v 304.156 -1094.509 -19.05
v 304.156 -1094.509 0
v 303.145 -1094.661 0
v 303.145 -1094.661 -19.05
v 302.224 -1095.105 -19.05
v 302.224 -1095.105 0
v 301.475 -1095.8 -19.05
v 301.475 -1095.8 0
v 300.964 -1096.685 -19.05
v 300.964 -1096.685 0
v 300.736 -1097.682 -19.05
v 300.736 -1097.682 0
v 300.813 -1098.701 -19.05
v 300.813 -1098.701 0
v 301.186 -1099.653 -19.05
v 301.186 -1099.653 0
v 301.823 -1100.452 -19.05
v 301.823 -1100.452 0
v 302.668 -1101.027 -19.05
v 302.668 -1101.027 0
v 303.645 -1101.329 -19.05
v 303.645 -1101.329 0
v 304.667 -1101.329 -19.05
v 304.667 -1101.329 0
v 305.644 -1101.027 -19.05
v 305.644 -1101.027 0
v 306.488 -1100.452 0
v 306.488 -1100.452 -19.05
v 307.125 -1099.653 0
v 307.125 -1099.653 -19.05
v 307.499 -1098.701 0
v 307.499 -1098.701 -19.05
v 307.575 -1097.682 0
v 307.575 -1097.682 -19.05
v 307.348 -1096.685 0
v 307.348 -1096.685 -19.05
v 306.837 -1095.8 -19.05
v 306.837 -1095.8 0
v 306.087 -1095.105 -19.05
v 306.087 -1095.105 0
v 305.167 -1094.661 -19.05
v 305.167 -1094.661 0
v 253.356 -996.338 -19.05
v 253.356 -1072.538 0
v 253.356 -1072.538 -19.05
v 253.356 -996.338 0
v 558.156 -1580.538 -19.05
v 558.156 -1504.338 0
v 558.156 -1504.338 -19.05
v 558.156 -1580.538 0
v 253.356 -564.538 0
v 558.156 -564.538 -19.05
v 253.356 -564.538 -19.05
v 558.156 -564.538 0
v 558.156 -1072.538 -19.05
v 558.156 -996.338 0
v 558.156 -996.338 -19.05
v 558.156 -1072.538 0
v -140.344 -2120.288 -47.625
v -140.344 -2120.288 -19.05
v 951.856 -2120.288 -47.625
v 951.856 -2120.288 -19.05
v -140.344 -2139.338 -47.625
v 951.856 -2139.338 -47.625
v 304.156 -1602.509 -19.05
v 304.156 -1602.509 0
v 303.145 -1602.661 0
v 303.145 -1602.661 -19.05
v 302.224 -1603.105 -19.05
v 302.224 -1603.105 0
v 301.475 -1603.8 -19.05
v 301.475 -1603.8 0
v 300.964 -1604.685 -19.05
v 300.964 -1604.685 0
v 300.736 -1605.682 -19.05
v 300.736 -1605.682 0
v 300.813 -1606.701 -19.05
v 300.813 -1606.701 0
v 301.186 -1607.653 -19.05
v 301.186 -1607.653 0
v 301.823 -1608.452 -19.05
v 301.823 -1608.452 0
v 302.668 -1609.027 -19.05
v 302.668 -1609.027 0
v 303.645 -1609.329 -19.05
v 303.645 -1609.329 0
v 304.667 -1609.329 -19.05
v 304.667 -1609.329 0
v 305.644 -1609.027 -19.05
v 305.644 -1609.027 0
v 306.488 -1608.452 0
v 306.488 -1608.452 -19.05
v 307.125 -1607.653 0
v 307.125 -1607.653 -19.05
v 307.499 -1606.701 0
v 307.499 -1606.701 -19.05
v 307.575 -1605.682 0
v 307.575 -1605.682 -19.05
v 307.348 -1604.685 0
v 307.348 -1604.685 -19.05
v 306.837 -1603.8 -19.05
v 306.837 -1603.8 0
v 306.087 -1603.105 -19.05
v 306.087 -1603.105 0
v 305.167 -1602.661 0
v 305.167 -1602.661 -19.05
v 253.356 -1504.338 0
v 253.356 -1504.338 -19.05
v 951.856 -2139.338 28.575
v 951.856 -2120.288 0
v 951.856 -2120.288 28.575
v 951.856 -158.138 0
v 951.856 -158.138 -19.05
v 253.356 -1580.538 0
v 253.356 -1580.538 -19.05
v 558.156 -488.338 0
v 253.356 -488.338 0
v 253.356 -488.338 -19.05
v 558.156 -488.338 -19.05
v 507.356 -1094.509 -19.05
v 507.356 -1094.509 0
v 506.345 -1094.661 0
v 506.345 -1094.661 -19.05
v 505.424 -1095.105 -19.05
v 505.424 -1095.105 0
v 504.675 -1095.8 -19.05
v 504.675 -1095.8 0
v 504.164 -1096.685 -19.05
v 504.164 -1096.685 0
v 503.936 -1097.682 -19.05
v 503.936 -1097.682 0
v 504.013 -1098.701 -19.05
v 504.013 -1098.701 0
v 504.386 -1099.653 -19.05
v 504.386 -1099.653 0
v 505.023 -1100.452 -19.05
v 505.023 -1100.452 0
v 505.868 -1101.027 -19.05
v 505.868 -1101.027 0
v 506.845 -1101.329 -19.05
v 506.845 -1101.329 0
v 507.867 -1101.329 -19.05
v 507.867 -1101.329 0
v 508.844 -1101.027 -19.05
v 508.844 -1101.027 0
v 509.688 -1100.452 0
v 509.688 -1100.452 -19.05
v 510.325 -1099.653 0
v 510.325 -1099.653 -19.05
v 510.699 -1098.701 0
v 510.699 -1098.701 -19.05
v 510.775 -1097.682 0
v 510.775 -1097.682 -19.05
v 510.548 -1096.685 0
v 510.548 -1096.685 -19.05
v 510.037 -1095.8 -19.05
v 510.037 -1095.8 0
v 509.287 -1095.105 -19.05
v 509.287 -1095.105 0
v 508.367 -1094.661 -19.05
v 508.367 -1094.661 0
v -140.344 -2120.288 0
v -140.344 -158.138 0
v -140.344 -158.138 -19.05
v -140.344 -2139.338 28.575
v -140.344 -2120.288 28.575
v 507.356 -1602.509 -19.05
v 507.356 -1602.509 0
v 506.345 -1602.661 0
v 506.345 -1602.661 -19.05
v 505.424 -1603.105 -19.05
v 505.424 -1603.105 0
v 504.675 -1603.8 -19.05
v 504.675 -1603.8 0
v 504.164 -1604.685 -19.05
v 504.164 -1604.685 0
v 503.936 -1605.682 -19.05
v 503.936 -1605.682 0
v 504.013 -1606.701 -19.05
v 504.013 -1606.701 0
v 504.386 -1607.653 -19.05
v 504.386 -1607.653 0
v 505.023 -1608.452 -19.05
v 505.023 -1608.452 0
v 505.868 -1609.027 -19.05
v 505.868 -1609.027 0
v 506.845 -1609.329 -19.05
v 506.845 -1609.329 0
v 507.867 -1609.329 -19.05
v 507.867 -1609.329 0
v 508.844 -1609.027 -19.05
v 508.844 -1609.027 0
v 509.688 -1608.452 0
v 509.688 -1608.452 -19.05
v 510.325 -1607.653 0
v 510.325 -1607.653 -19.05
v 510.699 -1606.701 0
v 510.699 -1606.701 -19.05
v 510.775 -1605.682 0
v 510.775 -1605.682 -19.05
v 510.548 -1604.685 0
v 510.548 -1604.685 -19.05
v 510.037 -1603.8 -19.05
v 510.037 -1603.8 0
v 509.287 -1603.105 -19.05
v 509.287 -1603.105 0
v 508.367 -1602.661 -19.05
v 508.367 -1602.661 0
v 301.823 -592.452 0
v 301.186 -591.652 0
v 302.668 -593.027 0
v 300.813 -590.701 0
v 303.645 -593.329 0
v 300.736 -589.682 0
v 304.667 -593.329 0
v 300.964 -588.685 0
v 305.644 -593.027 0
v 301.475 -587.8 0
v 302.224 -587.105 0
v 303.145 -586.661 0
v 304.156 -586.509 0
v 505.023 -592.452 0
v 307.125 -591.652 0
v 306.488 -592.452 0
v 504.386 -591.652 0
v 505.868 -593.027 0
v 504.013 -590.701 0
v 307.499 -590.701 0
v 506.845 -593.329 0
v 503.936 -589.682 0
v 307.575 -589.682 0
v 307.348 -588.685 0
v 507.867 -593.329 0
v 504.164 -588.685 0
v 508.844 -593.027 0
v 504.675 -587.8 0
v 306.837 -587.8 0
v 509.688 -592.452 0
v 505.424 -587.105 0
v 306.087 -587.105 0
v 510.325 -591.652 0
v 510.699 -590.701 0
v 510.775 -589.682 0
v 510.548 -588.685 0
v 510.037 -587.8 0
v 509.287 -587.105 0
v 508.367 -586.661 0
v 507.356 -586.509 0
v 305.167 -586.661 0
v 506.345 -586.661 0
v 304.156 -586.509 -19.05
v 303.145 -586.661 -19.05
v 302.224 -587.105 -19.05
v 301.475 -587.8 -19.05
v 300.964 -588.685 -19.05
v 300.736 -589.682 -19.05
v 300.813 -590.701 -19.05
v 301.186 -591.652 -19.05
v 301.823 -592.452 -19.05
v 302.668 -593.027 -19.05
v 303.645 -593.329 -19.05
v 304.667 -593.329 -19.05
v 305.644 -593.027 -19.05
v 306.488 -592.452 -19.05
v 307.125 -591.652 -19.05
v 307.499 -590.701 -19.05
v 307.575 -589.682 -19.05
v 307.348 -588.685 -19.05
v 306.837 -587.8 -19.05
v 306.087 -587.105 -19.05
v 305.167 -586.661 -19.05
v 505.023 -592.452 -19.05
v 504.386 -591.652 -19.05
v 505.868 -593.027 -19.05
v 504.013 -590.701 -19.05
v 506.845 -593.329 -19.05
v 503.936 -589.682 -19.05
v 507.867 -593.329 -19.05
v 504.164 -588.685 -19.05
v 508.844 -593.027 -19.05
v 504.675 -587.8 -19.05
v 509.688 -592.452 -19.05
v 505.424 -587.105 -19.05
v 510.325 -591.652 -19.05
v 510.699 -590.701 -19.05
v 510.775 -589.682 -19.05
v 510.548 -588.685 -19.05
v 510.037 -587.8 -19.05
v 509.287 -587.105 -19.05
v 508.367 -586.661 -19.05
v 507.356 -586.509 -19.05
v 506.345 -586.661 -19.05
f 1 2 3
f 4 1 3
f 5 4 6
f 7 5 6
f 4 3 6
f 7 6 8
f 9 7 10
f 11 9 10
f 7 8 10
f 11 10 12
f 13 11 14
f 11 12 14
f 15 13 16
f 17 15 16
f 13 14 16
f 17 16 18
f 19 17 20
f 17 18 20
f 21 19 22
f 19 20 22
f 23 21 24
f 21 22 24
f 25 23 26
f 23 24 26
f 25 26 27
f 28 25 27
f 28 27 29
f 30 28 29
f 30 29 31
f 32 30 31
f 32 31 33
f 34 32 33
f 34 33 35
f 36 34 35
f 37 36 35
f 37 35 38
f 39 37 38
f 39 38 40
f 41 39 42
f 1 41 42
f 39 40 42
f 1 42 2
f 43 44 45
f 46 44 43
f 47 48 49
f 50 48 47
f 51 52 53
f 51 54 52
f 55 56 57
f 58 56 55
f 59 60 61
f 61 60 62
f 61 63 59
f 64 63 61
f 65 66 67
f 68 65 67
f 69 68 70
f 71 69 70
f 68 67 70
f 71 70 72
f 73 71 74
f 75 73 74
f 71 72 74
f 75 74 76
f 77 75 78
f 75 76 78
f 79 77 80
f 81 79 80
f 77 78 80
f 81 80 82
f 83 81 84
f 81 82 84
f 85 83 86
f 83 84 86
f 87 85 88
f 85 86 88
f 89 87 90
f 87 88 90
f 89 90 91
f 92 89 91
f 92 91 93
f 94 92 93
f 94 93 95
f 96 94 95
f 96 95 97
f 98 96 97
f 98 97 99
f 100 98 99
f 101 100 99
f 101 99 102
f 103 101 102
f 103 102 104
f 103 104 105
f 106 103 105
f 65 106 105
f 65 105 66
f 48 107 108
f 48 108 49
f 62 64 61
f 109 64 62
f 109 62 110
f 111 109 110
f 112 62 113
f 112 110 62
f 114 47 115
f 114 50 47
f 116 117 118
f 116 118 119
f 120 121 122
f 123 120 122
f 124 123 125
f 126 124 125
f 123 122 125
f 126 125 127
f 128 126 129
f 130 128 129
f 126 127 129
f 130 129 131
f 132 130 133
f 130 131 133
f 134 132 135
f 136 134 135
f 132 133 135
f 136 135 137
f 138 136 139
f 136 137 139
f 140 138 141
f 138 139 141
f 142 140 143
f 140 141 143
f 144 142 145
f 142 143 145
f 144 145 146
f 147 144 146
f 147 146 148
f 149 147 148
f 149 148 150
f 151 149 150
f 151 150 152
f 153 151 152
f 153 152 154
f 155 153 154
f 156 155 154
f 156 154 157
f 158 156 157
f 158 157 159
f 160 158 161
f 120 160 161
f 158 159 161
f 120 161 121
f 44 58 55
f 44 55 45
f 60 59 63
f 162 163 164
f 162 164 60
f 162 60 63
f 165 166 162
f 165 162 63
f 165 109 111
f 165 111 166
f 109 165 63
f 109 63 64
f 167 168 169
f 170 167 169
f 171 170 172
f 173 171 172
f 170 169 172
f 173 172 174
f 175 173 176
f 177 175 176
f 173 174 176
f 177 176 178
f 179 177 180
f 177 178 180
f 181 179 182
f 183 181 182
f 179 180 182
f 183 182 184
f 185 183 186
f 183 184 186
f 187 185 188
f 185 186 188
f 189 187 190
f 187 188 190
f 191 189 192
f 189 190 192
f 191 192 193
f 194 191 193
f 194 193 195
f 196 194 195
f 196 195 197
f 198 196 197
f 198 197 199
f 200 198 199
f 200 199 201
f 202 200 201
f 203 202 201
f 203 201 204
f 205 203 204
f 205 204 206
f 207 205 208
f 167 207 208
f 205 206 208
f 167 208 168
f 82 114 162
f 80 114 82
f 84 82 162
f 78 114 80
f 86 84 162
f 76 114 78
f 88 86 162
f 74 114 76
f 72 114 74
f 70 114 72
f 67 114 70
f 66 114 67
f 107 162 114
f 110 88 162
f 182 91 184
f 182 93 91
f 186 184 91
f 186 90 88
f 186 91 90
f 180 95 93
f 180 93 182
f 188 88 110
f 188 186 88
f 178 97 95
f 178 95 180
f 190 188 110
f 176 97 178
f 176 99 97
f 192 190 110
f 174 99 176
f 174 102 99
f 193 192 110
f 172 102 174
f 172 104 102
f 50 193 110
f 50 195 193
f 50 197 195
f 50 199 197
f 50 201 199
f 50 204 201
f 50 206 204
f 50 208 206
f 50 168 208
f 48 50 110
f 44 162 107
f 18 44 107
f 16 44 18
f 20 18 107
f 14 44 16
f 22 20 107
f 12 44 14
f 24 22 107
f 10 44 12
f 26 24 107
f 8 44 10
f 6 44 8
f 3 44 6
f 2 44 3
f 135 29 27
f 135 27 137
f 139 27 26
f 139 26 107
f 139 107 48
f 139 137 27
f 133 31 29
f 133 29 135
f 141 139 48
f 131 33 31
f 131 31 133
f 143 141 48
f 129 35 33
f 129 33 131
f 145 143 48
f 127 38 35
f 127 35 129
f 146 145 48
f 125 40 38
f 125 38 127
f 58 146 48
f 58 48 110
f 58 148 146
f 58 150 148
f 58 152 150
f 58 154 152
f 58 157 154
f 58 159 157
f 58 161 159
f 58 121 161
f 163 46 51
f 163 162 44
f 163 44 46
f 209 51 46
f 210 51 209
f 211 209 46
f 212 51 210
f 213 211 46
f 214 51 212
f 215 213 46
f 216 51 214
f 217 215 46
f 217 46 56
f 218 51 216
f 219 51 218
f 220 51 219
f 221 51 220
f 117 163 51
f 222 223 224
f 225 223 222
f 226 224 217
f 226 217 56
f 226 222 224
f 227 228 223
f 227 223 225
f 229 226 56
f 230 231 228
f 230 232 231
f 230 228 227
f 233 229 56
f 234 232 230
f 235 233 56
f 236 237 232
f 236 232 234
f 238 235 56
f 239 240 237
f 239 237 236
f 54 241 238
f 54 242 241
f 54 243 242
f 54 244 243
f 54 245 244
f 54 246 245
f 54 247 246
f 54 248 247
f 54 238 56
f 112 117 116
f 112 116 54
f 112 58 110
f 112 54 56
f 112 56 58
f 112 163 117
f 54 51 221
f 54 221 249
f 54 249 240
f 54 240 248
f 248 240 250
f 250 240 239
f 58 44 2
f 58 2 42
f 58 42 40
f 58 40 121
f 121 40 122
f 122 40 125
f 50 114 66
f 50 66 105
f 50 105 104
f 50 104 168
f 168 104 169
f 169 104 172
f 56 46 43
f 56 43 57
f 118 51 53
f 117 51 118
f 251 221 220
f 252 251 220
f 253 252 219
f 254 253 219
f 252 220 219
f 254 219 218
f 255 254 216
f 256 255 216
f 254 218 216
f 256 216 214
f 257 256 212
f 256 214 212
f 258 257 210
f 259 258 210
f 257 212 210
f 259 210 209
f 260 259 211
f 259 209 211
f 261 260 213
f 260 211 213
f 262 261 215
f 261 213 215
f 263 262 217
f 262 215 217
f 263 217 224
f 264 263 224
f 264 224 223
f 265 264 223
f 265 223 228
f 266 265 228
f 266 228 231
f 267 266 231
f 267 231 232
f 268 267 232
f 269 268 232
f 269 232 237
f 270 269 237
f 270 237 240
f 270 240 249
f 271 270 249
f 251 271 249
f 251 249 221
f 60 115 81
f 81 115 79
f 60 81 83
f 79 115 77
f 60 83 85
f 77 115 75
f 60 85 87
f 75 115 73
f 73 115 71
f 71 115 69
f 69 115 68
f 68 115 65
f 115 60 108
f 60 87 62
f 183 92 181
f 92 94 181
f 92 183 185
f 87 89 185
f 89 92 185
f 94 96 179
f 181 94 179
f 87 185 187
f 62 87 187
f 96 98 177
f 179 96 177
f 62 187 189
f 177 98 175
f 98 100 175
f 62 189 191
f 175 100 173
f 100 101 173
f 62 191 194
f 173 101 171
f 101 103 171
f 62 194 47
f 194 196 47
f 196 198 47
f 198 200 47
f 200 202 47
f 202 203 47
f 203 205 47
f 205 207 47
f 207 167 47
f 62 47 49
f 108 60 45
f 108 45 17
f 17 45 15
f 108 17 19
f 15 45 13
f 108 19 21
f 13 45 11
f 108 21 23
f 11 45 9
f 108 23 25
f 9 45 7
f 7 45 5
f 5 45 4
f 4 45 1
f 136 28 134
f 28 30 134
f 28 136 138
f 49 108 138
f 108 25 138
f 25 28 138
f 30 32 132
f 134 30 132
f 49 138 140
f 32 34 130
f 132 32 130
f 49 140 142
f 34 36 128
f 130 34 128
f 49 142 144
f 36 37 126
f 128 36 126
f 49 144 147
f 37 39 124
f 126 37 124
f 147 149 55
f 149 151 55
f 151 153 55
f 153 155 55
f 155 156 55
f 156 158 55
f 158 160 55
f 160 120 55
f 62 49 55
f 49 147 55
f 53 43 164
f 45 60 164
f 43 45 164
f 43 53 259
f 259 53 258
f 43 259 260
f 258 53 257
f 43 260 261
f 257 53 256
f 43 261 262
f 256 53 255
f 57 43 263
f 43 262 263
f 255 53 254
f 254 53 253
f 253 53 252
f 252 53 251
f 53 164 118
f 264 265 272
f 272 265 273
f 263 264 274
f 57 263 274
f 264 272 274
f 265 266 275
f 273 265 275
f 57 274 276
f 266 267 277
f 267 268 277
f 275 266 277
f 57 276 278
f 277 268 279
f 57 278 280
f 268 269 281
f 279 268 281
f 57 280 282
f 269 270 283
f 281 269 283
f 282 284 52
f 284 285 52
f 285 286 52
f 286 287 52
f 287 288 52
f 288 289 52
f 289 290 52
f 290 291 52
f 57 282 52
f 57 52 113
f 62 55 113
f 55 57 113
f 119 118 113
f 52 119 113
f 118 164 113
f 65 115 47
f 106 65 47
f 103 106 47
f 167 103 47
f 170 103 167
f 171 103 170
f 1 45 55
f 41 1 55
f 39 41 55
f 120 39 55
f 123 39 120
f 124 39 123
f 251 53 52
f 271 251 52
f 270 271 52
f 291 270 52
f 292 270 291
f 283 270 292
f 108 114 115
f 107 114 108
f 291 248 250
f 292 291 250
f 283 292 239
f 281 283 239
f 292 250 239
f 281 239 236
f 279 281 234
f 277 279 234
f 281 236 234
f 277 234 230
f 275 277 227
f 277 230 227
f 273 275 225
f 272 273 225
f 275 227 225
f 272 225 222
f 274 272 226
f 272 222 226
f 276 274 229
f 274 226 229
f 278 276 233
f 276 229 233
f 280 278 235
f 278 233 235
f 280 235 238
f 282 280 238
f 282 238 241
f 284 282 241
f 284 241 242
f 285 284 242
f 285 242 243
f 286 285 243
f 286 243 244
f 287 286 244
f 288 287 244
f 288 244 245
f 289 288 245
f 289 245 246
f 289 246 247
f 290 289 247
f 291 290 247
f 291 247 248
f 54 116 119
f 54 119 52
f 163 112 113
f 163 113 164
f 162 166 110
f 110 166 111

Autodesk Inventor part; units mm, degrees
ref_plane "YZ Plane" through (0, 0, 0) normal (1, 0, 0) x (0, 1, 0)
ref_plane "XZ Plane" through (0, 0, 0) normal (0, 1, 0) x (-1, 0, 0)
ref_plane "XY Plane" through (0, 0, 0) normal (0, 0, 1) x (1, 0, 0)
sketch "Sketch1" plane through (0, 0, 0) normal (0, 0, 1) x (1, 0, 0)
  line L0 (-140.3442, -2139.338) -> (951.8558, -2139.338)
  line L1 (951.8558, -2139.338) -> (951.8558, -158.138)
  line L2 (951.8558, -158.138) -> (-140.3442, -158.138)
  line L3 (-140.3442, -158.138) -> (-140.3442, -2139.338)
  line L4 (253.3558, -488.338) -> (558.1558, -488.338)
  line L5 (558.1558, -488.338) -> (558.1558, -564.538)
  line L6 (558.1558, -564.538) -> (253.3558, -564.538)
  line L7 (253.3558, -564.538) -> (253.3558, -488.338)
  line L8 (253.3558, -996.338) -> (558.1558, -996.338)
  line L9 (558.1558, -996.338) -> (558.1558, -1072.538)
  line L10 (558.1558, -1072.538) -> (253.3558, -1072.538)
  line L11 (253.3558, -1072.538) -> (253.3558, -996.338)
  line L12 (253.3558, -1504.338) -> (558.1558, -1504.338)
  line L13 (558.1558, -1504.338) -> (558.1558, -1580.538)
  line L14 (558.1558, -1580.538) -> (253.3558, -1580.538)
  line L15 (253.3558, -1580.538) -> (253.3558, -1504.338)
  point P0 (0, 0)
  dimension "d0" = 1092.2
  dimension "d1" = 1981.2
  dimension "d2" = 393.7
  dimension "d3" = 393.7
  dimension "d4" = 393.7
  dimension "d5" = 304.8
  dimension "d6" = 304.8
  dimension "d7" = 304.8
  dimension "d8" = 76.2
  dimension "d9" = 76.2
  dimension "d10" = 76.2
  dimension "d11" = 558.8
  dimension "d12" = 1066.8
  dimension "d13" = 1574.8
extrude "Extrusion1" add sketch "Sketch1" against normal blind 19.05
sketch "Sketch2" plane through (-140.3442, -2139.338, 0) normal (0, -1, 0) x (1, 0, 0)
  line L0 (0, -19.05) -> (1092.2, -19.05) projected
  line L1 (1092.2, 0) -> (1092.2, -19.05) projected
  line L2 (0, 0) -> (1092.2, 0) projected
  line L3 (0, 0) -> (0, -19.05) projected
  line L4 (0, -19.05) -> (1092.2, -19.05) projected
  line L5 (1092.2, 0) -> (1092.2, -19.05) projected
  line L6 (0, 0) -> (1092.2, 0) projected
  line L7 (0, 0) -> (0, -19.05) projected
  line L8 (1092.2, 28.575) -> (0, 28.575)
  line L9 (0, 28.575) -> (0, -47.625)
  line L10 (0, -47.625) -> (1092.2, -47.625)
  line L11 (1092.2, -47.625) -> (1092.2, 28.575)
  point P0 (140.3442, 0)
  dimension "d16" = 76.2
  dimension "d17" = 28.575
extrude "Extrusion2" add sketch "Sketch2" against normal blind 19.05 contours L0 L11 L10 L9 | L9 L8 L11 L2
sketch "Sketch3" plane through (0, 0, -19.05) normal (0, 0, -1) x (-1, 0, 0)
  line L0 (-253.3558, -996.338) -> (-253.3558, -1072.538) projected
  line L1 (-253.3558, -1072.538) -> (-558.1558, -1072.538) projected
  line L2 (-558.1558, -1072.538) -> (-558.1558, -996.338) projected
  line L3 (-253.3558, -488.338) -> (-253.3558, -564.538) projected
  line L4 (-253.3558, -564.538) -> (-558.1558, -564.538) projected
  line L5 (-558.1558, -564.538) -> (-558.1558, -488.338) projected
  line L6 (-253.3558, -1504.338) -> (-253.3558, -1580.538) projected
  line L7 (-253.3558, -1580.538) -> (-558.1558, -1580.538) projected
  line L8 (-558.1558, -1580.538) -> (-558.1558, -1504.338) projected
  point P0 (0, 0)
  point P1 (-507.3558, -589.938)
  point P2 (-304.1558, -589.938)
  point P3 (-507.3558, -1097.938)
  point P4 (-304.1558, -1097.938)
  point P5 (-507.3558, -1605.938)
  point P6 (-304.1558, -1605.938)
  dimension "d20" = 50.8
  dimension "d21" = 50.8
  dimension "d22" = 25.4
  dimension "d23" = 25.4
  dimension "d24" = 50.8
  dimension "d25" = 50.8
  dimension "d26" = 25.4
  dimension "d27" = 25.4
  dimension "d28" = 50.8
  dimension "d29" = 25.4
  dimension "d30" = 50.8
  dimension "d31" = 25.4
hole "Hole1" at (507.3558, -589.938, -19.05) at (304.1558, -589.938, -19.05) at (507.3558, -1097.938, -19.05) at (304.1558, -1097.938, -19.05) at (507.3558, -1605.938, -19.05) at (304.1558, -1605.938, -19.05) direction (0, 0, 1) diameter 6.858 depth 25.4 tip angle 118
thread "Thread1" size "5/16-18 UNC" class "2B" standard "ANSI Unified Screw Threads" full length
thread "Thread2" size "5/16-18 UNC" class "2B" standard "ANSI Unified Screw Threads" full length
thread "Thread3" size "5/16-18 UNC" class "2B" standard "ANSI Unified Screw Threads" full length
thread "Thread4" size "5/16-18 UNC" class "2B" standard "ANSI Unified Screw Threads" full length
thread "Thread5" size "5/16-18 UNC" class "2B" standard "ANSI Unified Screw Threads" full length
thread "Thread6" size "5/16-18 UNC" class "2B" standard "ANSI Unified Screw Threads" full length
equation "\"d6\" = d5"
equation "\"d7\" = d5"
equation "\"d9\" = d8"
equation "\"d10\" = d8"
properties part number "feederStationSlots"
